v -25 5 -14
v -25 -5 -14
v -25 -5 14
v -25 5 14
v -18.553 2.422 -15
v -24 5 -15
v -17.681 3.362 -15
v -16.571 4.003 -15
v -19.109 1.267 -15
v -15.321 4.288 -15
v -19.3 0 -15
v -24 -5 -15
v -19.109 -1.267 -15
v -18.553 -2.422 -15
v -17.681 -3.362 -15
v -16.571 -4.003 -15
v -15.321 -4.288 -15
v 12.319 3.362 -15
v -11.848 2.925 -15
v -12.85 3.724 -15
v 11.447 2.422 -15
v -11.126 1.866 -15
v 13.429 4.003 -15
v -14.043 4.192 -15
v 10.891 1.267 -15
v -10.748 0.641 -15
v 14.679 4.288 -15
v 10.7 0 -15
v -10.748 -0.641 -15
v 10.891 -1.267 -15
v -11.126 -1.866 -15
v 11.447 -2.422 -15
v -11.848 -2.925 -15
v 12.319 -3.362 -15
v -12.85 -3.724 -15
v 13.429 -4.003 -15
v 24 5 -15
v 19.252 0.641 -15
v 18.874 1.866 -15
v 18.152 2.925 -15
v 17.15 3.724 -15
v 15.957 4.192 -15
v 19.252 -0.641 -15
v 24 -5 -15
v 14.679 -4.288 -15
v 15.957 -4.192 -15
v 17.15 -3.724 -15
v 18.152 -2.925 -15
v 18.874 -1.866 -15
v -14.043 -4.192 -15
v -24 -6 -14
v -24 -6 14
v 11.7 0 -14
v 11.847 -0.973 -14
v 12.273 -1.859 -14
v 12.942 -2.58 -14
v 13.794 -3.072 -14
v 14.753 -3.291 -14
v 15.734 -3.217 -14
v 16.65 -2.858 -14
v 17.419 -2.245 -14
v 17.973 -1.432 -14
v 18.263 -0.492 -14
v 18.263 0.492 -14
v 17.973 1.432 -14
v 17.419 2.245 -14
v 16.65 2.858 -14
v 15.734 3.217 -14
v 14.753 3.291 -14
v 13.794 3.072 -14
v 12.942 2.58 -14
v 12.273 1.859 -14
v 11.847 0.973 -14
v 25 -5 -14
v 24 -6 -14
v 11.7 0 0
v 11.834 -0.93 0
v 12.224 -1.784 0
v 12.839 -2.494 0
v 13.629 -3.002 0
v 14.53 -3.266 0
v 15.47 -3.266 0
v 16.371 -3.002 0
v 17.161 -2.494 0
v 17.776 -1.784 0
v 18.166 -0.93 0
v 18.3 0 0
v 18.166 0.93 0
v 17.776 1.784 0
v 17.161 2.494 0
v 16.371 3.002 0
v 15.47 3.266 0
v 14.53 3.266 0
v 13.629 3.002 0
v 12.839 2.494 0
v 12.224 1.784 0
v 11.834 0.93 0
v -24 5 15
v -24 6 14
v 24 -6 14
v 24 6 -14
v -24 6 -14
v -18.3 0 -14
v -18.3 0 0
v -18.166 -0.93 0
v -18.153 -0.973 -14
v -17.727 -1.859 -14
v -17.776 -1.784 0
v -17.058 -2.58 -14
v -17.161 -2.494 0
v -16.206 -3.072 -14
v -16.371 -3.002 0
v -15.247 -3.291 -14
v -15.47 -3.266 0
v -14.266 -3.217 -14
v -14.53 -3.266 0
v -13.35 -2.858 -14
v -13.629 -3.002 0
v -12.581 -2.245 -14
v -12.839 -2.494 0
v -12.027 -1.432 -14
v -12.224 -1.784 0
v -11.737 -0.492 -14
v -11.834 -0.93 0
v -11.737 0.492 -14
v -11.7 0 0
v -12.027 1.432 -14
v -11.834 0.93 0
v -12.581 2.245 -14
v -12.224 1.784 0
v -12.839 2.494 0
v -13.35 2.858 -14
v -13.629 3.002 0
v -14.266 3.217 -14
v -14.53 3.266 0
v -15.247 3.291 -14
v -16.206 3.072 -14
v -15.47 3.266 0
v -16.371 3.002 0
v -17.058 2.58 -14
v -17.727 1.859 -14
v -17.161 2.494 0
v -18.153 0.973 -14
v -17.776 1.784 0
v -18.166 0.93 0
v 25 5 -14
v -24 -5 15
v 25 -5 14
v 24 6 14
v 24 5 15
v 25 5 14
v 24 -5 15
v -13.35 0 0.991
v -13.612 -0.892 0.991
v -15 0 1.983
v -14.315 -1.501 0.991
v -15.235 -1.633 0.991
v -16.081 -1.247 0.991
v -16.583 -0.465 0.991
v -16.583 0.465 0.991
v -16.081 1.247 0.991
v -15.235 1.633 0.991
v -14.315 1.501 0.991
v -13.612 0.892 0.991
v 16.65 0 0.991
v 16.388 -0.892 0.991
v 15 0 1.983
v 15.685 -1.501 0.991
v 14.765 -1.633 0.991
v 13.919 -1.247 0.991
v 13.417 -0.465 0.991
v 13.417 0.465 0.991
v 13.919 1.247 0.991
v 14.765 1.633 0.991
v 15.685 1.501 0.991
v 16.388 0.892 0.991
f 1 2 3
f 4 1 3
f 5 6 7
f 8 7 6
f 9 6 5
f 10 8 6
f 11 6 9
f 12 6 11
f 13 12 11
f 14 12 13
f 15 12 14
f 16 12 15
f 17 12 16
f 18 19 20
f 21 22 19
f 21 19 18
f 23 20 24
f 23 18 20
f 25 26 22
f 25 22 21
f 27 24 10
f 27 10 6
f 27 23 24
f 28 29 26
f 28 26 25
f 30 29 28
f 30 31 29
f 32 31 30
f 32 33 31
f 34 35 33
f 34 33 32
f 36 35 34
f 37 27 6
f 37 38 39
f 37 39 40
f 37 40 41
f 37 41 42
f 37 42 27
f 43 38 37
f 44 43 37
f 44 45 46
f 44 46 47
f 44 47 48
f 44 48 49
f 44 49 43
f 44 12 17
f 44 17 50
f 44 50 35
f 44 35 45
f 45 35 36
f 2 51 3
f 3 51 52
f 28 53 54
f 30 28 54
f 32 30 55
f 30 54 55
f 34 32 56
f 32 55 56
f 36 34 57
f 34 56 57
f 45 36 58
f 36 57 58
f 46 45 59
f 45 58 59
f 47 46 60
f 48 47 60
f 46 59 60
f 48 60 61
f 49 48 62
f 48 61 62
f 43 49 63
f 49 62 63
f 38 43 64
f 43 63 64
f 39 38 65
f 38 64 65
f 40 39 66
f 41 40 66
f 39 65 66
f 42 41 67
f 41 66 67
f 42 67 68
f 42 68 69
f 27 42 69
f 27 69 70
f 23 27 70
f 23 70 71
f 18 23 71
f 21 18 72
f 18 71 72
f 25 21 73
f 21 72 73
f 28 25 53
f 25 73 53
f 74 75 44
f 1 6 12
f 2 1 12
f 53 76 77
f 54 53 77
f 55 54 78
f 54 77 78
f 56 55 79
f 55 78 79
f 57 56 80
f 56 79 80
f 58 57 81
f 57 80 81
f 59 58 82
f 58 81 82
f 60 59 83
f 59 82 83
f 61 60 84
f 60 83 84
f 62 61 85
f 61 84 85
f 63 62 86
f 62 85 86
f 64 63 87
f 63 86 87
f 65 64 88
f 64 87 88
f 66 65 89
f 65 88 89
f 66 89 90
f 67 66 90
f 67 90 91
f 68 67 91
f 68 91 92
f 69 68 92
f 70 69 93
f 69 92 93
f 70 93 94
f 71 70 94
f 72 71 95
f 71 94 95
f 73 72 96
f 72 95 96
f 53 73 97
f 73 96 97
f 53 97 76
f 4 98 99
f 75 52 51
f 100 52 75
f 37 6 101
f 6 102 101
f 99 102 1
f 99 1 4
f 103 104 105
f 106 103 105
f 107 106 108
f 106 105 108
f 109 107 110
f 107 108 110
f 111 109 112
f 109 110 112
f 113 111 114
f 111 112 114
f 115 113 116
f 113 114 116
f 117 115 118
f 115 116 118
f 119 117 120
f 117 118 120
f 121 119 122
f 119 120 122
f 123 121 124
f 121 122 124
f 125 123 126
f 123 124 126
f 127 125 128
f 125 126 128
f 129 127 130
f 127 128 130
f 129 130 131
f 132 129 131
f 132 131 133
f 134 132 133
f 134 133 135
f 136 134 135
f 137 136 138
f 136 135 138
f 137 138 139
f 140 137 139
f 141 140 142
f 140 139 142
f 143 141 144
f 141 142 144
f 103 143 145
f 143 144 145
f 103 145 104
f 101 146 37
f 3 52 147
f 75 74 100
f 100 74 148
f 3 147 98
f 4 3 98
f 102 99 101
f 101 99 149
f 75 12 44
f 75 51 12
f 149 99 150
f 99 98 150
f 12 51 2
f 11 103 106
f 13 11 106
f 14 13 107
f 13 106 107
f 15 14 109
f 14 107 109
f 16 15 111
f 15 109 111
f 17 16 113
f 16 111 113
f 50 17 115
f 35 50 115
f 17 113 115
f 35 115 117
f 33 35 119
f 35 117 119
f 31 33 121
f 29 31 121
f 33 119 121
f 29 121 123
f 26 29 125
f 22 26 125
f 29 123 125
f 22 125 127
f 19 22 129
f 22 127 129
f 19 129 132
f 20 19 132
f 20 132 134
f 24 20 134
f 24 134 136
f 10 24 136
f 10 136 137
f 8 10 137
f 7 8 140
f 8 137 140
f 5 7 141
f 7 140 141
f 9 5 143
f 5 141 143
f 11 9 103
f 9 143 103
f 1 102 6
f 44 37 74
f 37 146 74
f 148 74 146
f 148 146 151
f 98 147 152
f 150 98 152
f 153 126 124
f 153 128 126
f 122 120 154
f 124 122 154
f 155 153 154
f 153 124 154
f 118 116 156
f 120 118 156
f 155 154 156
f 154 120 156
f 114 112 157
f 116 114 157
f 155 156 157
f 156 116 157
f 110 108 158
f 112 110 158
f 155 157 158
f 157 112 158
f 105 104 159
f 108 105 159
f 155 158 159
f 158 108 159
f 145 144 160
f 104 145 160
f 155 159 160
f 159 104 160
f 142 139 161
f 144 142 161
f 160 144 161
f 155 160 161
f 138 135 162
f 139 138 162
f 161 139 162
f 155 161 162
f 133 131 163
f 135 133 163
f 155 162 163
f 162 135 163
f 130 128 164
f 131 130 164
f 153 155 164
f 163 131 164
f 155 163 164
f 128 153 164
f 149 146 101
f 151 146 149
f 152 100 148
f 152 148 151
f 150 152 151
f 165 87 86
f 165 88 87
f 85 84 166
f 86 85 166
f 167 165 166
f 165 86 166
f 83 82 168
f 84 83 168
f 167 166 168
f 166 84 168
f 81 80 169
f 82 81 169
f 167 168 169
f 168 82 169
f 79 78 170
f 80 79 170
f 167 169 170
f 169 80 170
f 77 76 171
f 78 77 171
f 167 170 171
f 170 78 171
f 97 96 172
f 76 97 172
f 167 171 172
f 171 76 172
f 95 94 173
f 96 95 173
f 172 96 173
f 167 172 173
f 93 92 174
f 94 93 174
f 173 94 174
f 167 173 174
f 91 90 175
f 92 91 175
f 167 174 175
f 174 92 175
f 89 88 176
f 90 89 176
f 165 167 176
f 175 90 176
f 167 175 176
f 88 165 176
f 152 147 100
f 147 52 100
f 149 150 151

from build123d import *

# Parameters (mm, degrees)
F0_W     = 50
F0_H     = 30
F1_DEPTH = 6
F3_D     = 6.6
F3_DEPTH = 15
F3_TIP   = 1.9828400428
F4_SIZE  = 1


with BuildPart() as f1:
    # F0 (on Front) → F1 (new body, symmetric)
    with BuildSketch(Plane.XZ):
        Rectangle(F0_W, F0_H)
    extrude(amount=F1_DEPTH, both=True)

    # F3
    with Locations(Plane(origin=(0, 0, -15), x_dir=(1, 0, 0), z_dir=(0, 0, -1))):
        with Locations((-15, 0), (15, 0)):
            Hole(F3_D / 2, depth=F3_DEPTH)
            with Locations((0, 0, -(F3_DEPTH + F3_TIP / 2))):  # 118° drill point
                Cone(0, F3_D / 2, F3_TIP, mode=Mode.SUBTRACT)

    # F4
    f4_edges = [f1.edges().sort_by_distance(p)[0] for p in [
        (0, -6, -15),
        (25, -6, 0),
        (0, -6, 15),
        (-25, -6, 0),
        (25, 0, 15),
        (0, 6, 15),
        (-25, 0, 15),
        (25, 0, -15),
        (25, 6, 0),
        (0, 6, -15),
        (-25, 6, 0),
        (-25, 0, -15),
        (-18.3, 0, -15),
        (11.7, 0, -15),
    ]]
    chamfer(f4_edges, length=F4_SIZE)


solid = f1.part
